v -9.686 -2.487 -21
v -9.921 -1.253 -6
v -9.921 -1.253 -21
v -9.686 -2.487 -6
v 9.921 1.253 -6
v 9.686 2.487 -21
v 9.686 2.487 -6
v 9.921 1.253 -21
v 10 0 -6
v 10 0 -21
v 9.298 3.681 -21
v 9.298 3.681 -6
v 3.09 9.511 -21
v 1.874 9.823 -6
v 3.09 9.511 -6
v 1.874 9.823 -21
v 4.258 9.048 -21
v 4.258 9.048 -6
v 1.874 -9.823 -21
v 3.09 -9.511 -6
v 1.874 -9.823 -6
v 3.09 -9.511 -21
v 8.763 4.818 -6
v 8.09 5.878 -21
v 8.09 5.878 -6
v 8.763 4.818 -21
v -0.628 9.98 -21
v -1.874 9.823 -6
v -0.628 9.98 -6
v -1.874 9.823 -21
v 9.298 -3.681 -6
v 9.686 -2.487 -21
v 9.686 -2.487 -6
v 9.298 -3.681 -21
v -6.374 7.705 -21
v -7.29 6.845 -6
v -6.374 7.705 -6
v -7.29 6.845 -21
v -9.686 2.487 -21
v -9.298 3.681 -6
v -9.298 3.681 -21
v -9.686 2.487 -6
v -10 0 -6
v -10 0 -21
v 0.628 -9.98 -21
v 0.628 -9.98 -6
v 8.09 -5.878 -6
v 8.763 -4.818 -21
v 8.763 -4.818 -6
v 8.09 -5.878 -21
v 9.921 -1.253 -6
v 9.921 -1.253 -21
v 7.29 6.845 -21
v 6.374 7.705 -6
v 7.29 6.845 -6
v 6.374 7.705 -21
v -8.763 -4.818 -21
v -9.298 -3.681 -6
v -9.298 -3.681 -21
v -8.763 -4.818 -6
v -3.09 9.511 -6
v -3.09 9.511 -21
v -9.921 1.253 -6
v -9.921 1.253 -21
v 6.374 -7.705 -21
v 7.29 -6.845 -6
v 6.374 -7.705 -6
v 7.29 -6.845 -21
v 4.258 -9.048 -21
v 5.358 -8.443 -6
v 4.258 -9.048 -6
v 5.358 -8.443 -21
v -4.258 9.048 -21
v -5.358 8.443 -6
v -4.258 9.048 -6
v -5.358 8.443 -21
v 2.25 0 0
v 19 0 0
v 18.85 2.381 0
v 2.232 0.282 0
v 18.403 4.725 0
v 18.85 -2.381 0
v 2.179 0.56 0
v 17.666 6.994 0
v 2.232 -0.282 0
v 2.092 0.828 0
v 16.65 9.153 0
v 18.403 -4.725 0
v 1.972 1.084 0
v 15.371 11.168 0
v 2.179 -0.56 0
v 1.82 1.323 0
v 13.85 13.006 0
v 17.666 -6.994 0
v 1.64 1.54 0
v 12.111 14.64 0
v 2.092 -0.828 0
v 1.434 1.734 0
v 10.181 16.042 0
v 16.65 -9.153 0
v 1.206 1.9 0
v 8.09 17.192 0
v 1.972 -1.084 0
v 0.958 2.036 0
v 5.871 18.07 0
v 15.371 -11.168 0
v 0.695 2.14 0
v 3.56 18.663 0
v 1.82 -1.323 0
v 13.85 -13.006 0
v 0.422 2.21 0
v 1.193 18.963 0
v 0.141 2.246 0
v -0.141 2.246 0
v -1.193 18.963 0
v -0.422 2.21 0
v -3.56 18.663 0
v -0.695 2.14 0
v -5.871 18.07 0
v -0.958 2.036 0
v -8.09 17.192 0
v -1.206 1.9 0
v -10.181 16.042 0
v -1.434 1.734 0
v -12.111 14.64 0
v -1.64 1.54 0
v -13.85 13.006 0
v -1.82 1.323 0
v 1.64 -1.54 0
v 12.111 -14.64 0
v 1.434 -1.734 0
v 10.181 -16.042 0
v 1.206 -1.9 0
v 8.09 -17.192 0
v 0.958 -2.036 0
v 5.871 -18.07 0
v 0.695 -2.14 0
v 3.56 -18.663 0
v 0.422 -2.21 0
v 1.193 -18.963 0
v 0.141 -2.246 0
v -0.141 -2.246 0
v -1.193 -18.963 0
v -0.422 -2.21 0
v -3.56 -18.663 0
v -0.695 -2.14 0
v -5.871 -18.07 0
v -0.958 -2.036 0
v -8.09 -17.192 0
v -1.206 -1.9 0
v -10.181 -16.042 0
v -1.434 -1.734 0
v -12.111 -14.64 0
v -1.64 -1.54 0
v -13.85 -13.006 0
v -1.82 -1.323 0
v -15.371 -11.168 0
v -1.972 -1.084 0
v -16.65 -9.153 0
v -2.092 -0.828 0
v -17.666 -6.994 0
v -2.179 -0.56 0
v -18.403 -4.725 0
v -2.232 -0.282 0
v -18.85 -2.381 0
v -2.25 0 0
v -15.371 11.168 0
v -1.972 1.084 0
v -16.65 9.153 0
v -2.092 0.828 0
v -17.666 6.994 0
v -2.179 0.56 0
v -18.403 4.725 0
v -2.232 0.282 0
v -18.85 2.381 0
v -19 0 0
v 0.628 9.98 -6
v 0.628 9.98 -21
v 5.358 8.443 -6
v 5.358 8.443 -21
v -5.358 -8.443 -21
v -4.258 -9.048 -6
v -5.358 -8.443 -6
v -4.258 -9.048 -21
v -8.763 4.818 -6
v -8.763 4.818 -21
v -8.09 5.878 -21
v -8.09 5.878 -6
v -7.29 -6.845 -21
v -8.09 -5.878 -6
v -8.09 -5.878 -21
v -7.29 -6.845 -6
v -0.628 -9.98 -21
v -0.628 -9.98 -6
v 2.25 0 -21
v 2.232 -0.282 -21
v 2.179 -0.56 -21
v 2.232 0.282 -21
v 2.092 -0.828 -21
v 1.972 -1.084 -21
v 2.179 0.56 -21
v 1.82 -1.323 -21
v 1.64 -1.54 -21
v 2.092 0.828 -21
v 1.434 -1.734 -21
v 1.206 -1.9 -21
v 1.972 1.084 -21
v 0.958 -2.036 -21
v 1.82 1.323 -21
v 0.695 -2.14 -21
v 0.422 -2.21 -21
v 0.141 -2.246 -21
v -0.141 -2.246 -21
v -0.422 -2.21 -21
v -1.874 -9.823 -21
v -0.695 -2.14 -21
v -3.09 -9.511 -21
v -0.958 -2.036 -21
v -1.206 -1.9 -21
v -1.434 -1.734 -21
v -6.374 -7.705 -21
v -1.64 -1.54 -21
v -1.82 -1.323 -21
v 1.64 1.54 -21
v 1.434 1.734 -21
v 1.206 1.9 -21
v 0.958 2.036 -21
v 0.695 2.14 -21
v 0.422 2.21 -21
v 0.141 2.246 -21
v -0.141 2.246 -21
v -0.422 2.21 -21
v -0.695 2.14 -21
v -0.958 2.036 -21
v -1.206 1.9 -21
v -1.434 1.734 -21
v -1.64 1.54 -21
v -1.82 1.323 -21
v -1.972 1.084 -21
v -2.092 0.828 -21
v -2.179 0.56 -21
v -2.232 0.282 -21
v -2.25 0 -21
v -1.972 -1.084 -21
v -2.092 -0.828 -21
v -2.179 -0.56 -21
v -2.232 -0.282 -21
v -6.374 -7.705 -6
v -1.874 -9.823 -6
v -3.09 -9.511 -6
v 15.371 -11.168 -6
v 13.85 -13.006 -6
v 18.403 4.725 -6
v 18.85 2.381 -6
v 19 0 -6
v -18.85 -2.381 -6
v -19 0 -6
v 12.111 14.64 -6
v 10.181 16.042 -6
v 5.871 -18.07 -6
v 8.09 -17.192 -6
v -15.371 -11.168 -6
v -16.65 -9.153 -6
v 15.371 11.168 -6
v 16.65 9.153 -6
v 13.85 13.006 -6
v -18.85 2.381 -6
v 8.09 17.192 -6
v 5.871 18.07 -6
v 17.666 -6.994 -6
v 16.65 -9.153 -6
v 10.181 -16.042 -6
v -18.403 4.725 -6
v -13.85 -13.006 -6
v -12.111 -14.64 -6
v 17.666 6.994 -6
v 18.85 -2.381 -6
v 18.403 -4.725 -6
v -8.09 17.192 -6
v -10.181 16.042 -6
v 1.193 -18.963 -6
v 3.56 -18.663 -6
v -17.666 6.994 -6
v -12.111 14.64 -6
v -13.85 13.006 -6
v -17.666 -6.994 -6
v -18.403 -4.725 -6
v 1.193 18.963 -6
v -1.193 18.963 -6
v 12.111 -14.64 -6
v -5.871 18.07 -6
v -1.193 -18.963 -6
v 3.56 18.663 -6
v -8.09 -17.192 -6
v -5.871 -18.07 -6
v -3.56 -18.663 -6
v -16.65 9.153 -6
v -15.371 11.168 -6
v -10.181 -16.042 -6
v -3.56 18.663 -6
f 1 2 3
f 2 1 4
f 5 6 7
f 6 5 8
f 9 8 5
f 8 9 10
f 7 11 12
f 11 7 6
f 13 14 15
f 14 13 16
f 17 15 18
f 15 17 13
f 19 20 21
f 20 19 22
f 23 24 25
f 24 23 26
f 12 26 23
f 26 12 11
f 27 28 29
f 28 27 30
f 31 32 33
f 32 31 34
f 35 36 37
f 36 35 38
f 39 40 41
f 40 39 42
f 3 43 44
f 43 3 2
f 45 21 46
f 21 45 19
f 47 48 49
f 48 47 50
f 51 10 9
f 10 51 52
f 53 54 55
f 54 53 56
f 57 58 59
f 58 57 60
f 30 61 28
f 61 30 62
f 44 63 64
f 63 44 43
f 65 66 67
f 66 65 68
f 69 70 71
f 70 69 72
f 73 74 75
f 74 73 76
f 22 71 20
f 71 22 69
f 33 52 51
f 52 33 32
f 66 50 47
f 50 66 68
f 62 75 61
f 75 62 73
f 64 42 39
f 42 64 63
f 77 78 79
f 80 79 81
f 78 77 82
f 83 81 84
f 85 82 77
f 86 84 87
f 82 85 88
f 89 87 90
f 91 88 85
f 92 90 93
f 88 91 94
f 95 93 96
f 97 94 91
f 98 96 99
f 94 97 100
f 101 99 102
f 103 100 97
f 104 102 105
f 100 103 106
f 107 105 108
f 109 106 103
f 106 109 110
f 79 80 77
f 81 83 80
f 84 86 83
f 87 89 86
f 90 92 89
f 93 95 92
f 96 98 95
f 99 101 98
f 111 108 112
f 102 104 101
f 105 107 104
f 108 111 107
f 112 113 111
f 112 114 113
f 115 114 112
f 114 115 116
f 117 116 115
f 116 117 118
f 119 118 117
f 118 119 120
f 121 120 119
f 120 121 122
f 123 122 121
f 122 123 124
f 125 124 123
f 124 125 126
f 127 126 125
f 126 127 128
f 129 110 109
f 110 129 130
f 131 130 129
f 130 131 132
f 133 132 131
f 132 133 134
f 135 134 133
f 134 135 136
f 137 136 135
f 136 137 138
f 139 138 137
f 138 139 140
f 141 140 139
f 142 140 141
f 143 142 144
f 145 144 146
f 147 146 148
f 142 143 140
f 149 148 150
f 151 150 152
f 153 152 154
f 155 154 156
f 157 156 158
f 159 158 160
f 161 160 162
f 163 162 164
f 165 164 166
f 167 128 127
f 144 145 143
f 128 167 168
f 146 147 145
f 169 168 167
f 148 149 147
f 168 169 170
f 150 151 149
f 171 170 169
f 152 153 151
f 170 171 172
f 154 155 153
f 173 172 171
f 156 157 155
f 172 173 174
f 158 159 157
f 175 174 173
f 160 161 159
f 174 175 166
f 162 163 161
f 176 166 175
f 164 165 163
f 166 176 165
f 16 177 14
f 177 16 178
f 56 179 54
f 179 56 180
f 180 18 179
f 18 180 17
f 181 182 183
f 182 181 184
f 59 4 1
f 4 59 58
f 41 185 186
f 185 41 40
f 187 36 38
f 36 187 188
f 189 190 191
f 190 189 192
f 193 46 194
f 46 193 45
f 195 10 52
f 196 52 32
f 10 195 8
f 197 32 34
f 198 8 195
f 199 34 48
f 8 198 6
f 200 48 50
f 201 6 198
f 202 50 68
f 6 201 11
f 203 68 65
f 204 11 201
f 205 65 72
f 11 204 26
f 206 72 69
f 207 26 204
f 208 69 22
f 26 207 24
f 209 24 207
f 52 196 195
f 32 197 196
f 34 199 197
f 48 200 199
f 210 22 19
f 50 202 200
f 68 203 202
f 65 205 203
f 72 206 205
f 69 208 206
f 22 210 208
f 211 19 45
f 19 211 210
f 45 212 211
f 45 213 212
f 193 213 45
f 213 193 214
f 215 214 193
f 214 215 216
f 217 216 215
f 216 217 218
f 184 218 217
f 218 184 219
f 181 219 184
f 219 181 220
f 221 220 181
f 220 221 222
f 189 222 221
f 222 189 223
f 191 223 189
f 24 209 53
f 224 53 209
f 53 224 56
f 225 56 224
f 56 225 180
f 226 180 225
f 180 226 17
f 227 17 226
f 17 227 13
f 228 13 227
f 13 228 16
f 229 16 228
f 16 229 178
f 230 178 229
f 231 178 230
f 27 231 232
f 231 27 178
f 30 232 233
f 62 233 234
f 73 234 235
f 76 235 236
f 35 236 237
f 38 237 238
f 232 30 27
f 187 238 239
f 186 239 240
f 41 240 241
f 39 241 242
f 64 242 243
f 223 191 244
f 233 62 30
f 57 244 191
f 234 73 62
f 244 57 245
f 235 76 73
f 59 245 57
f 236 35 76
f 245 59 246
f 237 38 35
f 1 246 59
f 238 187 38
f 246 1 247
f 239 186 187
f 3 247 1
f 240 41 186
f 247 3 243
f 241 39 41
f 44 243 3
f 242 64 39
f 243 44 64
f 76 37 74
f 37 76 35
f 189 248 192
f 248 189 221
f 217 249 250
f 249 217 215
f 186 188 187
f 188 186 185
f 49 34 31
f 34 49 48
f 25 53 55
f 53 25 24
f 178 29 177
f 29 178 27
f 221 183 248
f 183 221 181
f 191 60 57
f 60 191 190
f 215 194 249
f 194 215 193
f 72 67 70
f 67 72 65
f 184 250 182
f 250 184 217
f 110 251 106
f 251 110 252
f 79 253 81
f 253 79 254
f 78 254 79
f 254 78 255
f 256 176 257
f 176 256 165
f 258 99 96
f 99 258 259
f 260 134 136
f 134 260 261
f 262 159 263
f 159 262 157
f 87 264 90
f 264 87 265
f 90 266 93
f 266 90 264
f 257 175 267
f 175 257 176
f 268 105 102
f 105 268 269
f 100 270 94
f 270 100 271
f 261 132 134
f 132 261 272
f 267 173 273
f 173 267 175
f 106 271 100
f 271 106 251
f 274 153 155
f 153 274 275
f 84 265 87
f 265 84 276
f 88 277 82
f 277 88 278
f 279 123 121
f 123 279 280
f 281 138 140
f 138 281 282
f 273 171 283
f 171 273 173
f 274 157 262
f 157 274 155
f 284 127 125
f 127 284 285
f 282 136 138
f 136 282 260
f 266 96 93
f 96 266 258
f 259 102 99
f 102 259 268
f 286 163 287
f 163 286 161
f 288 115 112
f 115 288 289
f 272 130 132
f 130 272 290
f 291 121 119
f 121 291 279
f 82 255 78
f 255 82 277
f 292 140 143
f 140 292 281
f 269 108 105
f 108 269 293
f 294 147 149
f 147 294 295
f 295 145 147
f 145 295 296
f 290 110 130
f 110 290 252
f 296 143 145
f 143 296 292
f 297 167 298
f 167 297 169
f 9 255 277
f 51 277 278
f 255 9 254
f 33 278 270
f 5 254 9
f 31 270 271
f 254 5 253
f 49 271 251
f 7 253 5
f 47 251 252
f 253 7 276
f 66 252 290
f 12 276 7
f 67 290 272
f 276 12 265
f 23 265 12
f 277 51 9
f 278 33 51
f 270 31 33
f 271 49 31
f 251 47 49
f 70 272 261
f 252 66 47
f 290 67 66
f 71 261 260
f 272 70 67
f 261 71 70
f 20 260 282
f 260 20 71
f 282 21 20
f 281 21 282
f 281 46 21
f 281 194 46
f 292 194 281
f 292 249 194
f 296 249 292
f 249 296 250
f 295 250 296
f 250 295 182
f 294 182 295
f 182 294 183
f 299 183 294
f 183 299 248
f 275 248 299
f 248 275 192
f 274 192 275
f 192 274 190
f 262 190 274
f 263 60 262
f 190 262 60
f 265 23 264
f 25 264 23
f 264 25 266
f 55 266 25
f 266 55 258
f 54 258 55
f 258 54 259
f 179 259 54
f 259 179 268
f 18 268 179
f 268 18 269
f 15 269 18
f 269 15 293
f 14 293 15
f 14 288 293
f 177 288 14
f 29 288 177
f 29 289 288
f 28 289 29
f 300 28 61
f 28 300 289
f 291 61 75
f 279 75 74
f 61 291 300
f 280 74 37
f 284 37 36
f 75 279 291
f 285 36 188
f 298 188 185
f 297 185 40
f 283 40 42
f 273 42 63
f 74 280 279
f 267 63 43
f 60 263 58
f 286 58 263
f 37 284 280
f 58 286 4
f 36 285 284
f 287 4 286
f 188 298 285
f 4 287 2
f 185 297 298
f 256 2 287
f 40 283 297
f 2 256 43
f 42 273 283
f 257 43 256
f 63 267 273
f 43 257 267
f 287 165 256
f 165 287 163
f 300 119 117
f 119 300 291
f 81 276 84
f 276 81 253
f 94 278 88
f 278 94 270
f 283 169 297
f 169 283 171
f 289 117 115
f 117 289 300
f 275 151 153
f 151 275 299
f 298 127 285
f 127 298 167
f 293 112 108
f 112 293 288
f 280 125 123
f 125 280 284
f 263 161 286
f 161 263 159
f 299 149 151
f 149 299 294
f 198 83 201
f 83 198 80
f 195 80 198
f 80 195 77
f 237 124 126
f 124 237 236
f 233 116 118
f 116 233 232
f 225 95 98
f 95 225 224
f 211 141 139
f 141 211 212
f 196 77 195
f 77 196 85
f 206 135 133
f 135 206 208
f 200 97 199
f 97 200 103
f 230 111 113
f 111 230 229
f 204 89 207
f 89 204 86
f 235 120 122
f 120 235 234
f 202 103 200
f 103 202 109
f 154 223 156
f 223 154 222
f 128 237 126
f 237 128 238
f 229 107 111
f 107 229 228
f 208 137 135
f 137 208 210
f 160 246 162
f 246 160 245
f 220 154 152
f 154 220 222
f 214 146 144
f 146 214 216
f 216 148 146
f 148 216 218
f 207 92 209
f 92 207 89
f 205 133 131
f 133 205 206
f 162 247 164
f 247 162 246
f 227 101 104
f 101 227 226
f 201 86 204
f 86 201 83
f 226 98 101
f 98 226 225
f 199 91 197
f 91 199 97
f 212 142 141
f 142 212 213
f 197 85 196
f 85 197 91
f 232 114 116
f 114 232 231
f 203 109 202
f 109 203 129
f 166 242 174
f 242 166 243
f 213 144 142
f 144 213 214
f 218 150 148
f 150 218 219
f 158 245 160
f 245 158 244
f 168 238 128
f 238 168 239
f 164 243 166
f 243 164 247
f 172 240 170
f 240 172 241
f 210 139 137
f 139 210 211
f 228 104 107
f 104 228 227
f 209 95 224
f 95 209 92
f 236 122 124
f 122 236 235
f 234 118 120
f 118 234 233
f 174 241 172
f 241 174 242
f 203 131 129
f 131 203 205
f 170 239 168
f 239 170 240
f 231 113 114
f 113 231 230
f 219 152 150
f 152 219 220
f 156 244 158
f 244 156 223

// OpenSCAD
$fn = 50;


difference() {
	union() {
		translate(v = [0, 0, -21.0000000000]) {
			cylinder(h = 21, r = 10.0000000000);
		}
		translate(v = [0, 0, -6.0000000000]) {
			cylinder(h = 6, r = 19.0000000000);
		}
	}
	union() {
		#translate(v = [0, 0, -21]) {
			cylinder(h = 21, r = 2.2500000000);
		}
	}
}
